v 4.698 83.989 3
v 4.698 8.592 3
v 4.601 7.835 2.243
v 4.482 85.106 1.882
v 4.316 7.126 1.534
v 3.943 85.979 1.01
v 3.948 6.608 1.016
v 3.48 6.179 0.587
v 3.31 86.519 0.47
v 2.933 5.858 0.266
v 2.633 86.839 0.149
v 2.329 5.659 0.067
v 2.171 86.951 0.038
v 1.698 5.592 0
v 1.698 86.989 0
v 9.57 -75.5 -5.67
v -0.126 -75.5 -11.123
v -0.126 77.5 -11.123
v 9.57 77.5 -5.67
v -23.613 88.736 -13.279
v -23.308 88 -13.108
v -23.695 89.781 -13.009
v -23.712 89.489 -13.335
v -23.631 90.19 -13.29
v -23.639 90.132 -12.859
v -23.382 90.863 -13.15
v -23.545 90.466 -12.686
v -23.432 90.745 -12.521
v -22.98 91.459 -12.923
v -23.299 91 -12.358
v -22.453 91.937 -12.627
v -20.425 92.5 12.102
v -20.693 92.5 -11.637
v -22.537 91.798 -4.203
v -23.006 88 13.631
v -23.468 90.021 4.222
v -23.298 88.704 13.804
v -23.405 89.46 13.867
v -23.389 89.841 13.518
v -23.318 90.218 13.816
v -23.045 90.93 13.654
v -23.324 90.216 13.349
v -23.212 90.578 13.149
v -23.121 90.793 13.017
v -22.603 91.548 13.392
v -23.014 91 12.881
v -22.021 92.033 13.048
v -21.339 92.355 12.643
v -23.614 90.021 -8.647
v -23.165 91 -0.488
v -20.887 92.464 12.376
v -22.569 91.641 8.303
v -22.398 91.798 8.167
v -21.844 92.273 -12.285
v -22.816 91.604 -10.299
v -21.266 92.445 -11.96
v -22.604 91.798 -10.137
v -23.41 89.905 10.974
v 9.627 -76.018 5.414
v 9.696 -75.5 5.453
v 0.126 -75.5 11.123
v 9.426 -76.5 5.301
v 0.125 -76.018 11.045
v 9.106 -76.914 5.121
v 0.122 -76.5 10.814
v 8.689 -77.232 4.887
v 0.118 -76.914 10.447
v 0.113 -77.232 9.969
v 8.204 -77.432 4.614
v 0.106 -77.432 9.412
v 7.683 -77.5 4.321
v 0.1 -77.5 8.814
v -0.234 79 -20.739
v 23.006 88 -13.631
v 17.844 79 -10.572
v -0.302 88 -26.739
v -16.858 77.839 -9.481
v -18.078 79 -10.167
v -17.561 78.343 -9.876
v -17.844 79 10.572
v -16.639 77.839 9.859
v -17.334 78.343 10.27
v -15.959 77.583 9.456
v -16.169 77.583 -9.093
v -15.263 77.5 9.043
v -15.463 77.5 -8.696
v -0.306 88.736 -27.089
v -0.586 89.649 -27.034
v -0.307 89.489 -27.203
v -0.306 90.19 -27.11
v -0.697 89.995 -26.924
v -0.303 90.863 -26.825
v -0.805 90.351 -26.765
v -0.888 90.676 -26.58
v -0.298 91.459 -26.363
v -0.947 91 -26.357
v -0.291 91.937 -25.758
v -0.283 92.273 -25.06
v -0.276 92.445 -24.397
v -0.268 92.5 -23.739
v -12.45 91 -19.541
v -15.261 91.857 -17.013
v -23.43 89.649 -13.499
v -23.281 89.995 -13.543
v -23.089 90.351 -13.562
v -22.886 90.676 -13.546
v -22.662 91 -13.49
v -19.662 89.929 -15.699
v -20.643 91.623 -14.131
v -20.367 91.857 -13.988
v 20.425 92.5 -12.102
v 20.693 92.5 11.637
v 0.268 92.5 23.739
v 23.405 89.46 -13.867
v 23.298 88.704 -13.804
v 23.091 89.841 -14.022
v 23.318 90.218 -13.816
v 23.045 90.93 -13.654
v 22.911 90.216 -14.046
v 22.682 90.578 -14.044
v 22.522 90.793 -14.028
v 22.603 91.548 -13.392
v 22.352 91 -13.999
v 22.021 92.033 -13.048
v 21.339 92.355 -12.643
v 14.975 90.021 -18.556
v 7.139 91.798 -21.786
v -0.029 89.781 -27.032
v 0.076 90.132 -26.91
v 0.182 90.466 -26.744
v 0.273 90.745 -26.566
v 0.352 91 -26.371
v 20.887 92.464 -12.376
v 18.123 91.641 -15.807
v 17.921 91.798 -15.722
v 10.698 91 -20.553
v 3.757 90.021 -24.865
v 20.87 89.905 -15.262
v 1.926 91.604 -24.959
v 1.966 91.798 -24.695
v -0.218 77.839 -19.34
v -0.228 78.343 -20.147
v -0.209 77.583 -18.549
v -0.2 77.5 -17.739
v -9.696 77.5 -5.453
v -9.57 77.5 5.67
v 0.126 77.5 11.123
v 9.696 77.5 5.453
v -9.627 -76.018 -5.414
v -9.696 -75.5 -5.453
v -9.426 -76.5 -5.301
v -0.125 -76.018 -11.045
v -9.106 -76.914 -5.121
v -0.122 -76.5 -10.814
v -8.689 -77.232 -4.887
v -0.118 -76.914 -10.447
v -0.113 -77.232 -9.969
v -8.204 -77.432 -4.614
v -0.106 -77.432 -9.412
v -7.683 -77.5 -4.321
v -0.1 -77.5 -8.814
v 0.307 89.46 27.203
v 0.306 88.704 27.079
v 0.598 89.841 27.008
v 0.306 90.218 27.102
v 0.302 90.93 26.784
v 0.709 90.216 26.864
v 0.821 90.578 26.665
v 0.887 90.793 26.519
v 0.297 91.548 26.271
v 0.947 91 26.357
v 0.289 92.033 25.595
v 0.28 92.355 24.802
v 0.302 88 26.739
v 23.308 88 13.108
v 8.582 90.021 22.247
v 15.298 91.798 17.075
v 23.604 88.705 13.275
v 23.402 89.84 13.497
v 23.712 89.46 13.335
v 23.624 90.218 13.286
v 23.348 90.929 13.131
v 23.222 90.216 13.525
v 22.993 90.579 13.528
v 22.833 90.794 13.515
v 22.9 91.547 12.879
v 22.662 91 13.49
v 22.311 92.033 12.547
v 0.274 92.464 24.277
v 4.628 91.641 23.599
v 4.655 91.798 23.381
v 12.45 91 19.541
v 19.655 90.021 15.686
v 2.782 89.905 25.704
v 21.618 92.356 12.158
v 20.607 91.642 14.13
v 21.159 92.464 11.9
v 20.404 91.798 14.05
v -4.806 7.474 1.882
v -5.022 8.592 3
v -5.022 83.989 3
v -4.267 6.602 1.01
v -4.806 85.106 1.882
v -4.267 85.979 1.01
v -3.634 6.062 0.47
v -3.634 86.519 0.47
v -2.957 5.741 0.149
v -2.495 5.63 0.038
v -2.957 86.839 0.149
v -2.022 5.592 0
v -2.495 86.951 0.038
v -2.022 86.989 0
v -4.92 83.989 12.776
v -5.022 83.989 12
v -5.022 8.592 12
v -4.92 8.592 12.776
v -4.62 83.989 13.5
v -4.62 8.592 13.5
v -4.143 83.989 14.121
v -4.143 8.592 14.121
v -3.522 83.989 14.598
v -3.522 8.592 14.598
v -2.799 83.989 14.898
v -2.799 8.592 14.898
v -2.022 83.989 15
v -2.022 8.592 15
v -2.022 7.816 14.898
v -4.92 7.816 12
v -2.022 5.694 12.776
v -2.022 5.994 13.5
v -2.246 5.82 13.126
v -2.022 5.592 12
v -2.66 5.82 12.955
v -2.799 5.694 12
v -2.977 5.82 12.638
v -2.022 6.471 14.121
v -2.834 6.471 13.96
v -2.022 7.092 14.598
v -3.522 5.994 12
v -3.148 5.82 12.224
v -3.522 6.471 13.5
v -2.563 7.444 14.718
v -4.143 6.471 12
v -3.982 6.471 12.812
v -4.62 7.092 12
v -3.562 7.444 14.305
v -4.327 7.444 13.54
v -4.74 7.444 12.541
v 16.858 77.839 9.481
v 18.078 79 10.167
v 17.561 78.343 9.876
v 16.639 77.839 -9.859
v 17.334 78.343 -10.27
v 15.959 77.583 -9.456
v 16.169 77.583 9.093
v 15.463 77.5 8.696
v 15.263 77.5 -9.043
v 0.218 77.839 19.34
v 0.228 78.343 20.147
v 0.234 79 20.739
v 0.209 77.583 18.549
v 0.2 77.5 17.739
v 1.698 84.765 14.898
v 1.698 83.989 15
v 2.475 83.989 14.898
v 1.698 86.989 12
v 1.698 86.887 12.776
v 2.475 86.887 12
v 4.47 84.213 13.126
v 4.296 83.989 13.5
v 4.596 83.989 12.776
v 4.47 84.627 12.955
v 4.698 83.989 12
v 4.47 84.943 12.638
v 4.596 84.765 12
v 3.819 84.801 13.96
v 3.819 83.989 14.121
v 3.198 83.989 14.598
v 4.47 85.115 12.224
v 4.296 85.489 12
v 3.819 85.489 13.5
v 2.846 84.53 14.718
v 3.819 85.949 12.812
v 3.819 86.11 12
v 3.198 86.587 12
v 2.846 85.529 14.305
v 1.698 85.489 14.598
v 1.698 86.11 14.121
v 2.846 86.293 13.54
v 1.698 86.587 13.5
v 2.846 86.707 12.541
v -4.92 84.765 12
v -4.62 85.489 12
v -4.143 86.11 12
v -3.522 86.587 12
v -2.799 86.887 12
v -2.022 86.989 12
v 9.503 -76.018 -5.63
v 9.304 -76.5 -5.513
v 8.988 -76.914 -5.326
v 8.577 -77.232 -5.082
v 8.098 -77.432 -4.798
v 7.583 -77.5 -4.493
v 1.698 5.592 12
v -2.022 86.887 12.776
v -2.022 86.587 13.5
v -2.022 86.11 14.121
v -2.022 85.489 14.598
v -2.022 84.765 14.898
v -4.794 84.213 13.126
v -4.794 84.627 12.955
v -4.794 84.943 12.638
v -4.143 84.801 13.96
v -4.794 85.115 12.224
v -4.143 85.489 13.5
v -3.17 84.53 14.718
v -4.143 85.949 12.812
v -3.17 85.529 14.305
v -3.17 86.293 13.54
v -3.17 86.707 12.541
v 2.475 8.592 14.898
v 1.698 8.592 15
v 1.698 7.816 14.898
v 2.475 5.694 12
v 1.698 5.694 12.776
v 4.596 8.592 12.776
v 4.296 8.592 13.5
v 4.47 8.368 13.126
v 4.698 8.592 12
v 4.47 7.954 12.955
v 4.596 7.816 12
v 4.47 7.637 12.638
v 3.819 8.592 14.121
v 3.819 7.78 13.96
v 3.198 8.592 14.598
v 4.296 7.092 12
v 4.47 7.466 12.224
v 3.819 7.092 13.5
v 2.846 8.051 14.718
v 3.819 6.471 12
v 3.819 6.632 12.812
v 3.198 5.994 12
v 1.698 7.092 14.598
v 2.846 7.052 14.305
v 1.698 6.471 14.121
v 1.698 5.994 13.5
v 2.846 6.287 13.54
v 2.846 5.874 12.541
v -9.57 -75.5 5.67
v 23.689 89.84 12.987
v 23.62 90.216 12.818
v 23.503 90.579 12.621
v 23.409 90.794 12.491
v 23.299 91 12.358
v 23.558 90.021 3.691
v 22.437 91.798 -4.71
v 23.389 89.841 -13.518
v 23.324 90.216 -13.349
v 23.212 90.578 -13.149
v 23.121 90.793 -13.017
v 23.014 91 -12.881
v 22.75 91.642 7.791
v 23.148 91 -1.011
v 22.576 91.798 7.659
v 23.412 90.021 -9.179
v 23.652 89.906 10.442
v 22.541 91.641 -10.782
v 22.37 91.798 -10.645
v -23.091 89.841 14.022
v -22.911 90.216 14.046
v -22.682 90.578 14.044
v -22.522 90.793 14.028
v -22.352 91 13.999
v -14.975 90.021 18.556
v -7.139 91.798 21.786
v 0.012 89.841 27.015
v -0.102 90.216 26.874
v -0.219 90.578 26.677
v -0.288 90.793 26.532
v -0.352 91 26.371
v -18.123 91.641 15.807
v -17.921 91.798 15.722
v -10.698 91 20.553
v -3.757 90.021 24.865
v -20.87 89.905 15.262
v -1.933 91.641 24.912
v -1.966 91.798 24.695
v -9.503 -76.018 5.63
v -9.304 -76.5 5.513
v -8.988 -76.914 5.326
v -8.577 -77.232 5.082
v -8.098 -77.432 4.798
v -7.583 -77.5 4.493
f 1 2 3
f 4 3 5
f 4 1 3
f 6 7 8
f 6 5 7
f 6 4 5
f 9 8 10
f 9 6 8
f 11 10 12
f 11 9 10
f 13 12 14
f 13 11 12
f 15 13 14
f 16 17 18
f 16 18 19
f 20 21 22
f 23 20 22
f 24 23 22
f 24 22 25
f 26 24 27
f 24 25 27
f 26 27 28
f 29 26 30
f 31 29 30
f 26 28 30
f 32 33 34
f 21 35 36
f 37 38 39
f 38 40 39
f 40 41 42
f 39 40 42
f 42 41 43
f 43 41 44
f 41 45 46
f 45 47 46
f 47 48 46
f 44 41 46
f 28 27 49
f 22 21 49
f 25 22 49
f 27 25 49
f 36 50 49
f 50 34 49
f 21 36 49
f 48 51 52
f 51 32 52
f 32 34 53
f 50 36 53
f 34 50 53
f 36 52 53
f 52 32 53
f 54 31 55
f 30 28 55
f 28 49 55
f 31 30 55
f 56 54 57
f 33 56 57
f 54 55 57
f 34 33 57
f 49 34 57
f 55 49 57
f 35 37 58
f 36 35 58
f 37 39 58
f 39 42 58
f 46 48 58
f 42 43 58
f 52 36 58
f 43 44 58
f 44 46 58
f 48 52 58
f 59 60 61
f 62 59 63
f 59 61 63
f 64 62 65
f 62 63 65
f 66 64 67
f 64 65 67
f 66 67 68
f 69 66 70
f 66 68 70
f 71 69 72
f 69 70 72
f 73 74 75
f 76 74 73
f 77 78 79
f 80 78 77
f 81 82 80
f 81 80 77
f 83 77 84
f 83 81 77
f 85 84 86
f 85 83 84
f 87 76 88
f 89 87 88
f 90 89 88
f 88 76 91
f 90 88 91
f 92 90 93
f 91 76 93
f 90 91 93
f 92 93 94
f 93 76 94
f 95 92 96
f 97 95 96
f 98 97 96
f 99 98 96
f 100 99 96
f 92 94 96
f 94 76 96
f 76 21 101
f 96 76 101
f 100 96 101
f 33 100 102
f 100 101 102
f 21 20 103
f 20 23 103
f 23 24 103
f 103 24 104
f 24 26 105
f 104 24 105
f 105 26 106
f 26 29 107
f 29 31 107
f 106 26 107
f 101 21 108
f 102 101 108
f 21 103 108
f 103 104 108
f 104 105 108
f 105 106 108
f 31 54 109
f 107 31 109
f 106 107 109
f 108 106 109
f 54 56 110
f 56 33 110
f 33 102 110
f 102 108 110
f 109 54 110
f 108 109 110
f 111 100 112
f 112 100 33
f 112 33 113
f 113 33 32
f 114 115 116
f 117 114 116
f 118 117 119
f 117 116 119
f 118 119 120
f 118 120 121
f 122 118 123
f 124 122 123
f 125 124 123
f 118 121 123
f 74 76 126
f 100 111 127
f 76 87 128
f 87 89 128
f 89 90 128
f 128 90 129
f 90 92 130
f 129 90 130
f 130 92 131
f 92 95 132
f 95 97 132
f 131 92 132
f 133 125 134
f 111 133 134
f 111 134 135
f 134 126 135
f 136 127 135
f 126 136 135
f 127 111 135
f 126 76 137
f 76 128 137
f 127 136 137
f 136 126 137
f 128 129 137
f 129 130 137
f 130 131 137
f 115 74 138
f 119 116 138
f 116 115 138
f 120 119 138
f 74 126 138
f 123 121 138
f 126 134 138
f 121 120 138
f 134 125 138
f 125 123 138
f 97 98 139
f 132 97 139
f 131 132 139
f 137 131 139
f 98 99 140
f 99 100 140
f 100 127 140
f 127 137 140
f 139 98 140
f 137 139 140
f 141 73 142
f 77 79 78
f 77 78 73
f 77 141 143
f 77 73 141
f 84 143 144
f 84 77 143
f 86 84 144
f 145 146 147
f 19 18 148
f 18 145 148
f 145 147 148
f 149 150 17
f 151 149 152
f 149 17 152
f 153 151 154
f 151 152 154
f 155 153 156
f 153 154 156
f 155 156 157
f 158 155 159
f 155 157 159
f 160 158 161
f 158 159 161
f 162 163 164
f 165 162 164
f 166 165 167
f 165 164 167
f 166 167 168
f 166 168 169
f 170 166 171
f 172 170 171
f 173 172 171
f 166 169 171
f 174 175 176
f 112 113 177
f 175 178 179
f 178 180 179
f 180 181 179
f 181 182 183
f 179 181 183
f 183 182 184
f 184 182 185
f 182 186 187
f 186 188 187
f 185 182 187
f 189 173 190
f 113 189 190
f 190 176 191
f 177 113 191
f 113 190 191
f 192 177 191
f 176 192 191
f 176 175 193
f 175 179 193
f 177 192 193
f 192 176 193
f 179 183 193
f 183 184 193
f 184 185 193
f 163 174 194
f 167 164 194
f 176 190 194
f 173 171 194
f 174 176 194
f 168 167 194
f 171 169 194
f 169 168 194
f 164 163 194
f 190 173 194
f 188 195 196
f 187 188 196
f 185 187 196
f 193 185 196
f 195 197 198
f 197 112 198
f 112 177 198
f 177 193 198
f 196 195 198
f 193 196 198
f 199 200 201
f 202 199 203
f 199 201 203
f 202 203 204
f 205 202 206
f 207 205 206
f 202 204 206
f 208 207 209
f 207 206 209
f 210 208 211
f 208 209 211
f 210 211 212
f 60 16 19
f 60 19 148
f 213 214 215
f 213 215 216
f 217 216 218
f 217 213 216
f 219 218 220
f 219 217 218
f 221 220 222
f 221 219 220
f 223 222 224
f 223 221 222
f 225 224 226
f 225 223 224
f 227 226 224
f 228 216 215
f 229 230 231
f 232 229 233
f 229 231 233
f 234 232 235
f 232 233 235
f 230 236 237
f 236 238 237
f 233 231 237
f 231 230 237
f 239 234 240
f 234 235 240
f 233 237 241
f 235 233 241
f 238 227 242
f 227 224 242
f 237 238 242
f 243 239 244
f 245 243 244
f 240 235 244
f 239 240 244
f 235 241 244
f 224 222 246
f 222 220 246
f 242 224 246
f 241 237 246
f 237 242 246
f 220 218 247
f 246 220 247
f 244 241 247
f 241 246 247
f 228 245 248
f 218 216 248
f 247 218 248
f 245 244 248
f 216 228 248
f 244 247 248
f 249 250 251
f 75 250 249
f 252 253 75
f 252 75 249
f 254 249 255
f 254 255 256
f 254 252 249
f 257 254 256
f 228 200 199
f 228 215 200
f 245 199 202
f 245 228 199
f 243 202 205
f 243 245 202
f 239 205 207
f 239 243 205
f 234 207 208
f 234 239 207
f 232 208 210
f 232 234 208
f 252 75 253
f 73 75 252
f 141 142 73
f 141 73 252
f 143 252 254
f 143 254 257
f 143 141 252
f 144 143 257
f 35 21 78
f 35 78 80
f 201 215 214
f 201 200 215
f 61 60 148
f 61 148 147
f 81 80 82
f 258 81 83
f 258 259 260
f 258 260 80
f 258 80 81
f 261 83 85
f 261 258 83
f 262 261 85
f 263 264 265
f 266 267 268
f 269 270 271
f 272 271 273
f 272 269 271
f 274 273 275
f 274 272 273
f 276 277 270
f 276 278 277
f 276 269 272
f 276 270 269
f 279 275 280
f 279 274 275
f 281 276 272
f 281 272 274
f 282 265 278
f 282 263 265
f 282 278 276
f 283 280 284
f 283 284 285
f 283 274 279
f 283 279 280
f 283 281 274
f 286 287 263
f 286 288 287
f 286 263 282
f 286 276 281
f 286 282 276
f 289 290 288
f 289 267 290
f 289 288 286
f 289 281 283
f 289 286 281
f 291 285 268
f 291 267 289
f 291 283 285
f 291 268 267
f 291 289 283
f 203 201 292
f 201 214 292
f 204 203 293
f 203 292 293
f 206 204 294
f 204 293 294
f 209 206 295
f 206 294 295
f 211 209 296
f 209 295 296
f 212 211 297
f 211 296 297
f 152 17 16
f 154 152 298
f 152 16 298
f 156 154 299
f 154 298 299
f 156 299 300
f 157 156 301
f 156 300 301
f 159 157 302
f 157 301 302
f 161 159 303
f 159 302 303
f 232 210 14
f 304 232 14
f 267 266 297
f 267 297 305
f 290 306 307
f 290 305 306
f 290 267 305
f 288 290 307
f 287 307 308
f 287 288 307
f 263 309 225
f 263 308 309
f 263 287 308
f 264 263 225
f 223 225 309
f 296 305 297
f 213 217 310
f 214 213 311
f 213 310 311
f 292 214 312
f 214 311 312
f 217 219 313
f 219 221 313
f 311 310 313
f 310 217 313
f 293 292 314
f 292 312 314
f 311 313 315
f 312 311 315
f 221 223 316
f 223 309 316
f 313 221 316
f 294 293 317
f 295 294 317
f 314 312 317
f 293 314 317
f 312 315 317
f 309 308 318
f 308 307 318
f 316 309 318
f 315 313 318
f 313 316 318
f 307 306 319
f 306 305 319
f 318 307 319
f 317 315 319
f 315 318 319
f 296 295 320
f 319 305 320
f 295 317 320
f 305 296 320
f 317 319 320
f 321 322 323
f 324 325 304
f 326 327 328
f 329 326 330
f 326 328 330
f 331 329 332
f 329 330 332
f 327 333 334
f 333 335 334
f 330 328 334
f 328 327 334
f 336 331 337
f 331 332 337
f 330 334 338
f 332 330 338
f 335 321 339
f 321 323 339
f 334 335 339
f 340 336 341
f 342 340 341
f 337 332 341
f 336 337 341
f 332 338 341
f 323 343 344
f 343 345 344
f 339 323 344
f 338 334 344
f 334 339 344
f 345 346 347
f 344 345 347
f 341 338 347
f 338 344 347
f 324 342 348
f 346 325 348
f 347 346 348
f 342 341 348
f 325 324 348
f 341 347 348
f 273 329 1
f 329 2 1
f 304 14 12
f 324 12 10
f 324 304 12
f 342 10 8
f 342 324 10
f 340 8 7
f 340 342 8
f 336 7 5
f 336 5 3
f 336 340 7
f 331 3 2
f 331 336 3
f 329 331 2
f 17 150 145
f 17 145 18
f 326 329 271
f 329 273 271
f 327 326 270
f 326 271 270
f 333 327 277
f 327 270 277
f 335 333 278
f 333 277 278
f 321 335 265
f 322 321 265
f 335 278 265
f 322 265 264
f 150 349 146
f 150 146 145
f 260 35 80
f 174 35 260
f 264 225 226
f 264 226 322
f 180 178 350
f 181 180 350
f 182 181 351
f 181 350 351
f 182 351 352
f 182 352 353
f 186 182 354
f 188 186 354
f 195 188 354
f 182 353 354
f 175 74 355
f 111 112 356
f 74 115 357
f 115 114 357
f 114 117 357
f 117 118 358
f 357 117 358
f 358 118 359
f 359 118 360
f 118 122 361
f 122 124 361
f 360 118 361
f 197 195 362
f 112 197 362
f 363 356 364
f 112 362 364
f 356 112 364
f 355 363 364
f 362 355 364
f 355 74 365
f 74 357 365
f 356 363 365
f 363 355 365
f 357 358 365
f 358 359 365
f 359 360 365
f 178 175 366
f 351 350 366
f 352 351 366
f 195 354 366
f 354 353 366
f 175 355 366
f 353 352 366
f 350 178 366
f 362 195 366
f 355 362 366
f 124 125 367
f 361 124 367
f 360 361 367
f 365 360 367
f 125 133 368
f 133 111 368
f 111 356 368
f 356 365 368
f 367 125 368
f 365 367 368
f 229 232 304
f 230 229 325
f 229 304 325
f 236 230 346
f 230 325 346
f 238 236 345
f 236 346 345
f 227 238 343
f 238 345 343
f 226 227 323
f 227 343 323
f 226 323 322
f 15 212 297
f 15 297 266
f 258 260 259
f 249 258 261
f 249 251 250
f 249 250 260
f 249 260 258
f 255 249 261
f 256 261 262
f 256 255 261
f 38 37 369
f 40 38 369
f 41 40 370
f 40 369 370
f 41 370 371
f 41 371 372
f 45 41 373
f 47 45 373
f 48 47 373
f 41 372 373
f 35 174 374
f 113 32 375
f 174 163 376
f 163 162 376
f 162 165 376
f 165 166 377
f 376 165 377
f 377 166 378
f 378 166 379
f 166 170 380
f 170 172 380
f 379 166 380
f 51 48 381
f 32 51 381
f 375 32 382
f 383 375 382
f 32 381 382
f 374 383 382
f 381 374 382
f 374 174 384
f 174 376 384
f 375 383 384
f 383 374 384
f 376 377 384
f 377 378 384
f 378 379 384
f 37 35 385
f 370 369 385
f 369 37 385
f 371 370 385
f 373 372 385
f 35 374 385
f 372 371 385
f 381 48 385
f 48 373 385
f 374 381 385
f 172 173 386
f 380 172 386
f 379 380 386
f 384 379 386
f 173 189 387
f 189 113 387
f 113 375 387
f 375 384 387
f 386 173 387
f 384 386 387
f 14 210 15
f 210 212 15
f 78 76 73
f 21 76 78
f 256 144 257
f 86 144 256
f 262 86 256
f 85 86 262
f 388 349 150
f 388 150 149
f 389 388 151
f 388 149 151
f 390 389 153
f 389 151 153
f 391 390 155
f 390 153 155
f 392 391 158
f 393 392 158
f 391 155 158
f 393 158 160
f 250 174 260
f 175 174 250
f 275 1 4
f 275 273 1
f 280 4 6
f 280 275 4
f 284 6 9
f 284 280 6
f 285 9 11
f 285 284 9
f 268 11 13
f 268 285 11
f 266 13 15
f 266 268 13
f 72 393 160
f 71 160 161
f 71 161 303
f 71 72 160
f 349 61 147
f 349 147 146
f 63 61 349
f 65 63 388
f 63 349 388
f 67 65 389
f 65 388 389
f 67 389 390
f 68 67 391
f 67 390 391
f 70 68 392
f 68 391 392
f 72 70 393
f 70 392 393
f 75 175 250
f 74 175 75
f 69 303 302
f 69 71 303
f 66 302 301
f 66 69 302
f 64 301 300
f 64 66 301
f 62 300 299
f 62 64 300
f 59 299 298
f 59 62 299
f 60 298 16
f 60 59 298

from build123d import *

# Parameters (mm, degrees)
F1_DEPTH = 77.5
F3_DEPTH = 15
F3_TAPER = -30
F4_W     = 9.7201652825
F4_H     = 81.3968237489
F5_DEPTH = 15
F6_R     = 3
F6_2_R   = 3
F7_R     = 2


with BuildPart() as f1:
    # F0 (on Front) → F1 (new body, symmetric)
    with BuildSketch(Plane.XZ):
        Polygon((-0.1256162198, -11.1232604972), (9.5702180536, -5.6704170861), (9.6958342734, 5.4528434111), (0.1256162198, 11.1232604972), (-9.5702180536, 5.6704170861), (-9.6958342734, -5.4528434111), align=None)
    extrude(amount=F1_DEPTH, both=True)

    # F7
    f7_edges = [f1.edges().sort_by_distance(p)[0] for p in [
        (-4.910725, -77.5, -8.288052),
        (4.722301, -77.5, -8.396839),
        (9.633026, -77.5, -0.108787),
        (4.910725, -77.5, 8.288052),
        (-4.722301, -77.5, 8.396839),
        (-9.633026, -77.5, 0.108787),
    ]]
    fillet(f7_edges, radius=F7_R)


with BuildPart() as f3:
    # F2 (on face) → F3 (new body)
    with BuildSketch(Plane(origin=(0, 77.5, 0), x_dir=(-1, 0, 0), z_dir=(0, 1, 0))):
        Polygon((0.2229186467, -19.7393472), (17.2062354526, -9.676620389), (16.983316806, 10.062726811), (-0.2229186467, 19.7393472), (-17.2062354526, 9.676620389), (-16.983316806, -10.062726811), align=None)
        Polygon((9.6958342734, -5.4528434111), (0.1256162198, -11.1232604972), (-9.5702180536, -5.6704170861), (-9.6958342734, 5.4528434111), (-0.1256162198, 11.1232604972), (9.5702180536, 5.6704170861), align=None, mode=Mode.SUBTRACT)
        Polygon((-9.5702180536, -5.6704170861), (0.1256162198, -11.1232604972), (9.6958342734, -5.4528434111), (9.5702180536, 5.6704170861), (-0.1256162198, 11.1232604972), (-9.6958342734, 5.4528434111), align=None)
    extrude(amount=F3_DEPTH, taper=F3_TAPER)

    # F6#2
    f6_2_edges = [f3.edges().sort_by_distance(p)[0] for p in [
        (12.625357, 92.5, -22.449456),
        (-13.129121, 92.5, -22.158608),
        (-25.754478, 92.5, 0.290848),
        (-12.625357, 92.5, 22.449456),
        (13.129121, 92.5, 22.158608),
        (25.754478, 92.5, -0.290848),
        (8.380199, 77.5, -14.901037),
        (-8.714577, 77.5, -14.707984),
        (-17.094776, 77.5, 0.193053),
        (-8.380199, 77.5, 14.901037),
        (8.714577, 77.5, 14.707984),
        (17.094776, 77.5, -0.193053),
    ]]
    fillet(f6_2_edges, radius=F6_2_R)


with BuildPart() as f5:
    # F4 (on Top) → F5 (new body)
    with BuildSketch(Plane.XY):
        with Locations((-0.1620021649, 46.2903873995)):
            Rectangle(F4_W, F4_H)
    extrude(amount=F5_DEPTH)

    # F6
    f6_edges = [f5.edges().sort_by_distance(p)[0] for p in [
        (-0.162002, 86.988799, 15),
        (-5.022085, 46.290387, 15),
        (-0.162002, 5.591976, 15),
        (4.69808, 46.290387, 15),
        (4.69808, 5.591976, 7.5),
        (4.69808, 86.988799, 7.5),
        (4.69808, 46.290387, 0),
        (-5.022085, 86.988799, 7.5),
        (-5.022085, 5.591976, 7.5),
        (-5.022085, 46.290387, 0),
    ]]
    fillet(f6_edges, radius=F6_R)


solid = Compound([f1.part, f3.part, f5.part])
